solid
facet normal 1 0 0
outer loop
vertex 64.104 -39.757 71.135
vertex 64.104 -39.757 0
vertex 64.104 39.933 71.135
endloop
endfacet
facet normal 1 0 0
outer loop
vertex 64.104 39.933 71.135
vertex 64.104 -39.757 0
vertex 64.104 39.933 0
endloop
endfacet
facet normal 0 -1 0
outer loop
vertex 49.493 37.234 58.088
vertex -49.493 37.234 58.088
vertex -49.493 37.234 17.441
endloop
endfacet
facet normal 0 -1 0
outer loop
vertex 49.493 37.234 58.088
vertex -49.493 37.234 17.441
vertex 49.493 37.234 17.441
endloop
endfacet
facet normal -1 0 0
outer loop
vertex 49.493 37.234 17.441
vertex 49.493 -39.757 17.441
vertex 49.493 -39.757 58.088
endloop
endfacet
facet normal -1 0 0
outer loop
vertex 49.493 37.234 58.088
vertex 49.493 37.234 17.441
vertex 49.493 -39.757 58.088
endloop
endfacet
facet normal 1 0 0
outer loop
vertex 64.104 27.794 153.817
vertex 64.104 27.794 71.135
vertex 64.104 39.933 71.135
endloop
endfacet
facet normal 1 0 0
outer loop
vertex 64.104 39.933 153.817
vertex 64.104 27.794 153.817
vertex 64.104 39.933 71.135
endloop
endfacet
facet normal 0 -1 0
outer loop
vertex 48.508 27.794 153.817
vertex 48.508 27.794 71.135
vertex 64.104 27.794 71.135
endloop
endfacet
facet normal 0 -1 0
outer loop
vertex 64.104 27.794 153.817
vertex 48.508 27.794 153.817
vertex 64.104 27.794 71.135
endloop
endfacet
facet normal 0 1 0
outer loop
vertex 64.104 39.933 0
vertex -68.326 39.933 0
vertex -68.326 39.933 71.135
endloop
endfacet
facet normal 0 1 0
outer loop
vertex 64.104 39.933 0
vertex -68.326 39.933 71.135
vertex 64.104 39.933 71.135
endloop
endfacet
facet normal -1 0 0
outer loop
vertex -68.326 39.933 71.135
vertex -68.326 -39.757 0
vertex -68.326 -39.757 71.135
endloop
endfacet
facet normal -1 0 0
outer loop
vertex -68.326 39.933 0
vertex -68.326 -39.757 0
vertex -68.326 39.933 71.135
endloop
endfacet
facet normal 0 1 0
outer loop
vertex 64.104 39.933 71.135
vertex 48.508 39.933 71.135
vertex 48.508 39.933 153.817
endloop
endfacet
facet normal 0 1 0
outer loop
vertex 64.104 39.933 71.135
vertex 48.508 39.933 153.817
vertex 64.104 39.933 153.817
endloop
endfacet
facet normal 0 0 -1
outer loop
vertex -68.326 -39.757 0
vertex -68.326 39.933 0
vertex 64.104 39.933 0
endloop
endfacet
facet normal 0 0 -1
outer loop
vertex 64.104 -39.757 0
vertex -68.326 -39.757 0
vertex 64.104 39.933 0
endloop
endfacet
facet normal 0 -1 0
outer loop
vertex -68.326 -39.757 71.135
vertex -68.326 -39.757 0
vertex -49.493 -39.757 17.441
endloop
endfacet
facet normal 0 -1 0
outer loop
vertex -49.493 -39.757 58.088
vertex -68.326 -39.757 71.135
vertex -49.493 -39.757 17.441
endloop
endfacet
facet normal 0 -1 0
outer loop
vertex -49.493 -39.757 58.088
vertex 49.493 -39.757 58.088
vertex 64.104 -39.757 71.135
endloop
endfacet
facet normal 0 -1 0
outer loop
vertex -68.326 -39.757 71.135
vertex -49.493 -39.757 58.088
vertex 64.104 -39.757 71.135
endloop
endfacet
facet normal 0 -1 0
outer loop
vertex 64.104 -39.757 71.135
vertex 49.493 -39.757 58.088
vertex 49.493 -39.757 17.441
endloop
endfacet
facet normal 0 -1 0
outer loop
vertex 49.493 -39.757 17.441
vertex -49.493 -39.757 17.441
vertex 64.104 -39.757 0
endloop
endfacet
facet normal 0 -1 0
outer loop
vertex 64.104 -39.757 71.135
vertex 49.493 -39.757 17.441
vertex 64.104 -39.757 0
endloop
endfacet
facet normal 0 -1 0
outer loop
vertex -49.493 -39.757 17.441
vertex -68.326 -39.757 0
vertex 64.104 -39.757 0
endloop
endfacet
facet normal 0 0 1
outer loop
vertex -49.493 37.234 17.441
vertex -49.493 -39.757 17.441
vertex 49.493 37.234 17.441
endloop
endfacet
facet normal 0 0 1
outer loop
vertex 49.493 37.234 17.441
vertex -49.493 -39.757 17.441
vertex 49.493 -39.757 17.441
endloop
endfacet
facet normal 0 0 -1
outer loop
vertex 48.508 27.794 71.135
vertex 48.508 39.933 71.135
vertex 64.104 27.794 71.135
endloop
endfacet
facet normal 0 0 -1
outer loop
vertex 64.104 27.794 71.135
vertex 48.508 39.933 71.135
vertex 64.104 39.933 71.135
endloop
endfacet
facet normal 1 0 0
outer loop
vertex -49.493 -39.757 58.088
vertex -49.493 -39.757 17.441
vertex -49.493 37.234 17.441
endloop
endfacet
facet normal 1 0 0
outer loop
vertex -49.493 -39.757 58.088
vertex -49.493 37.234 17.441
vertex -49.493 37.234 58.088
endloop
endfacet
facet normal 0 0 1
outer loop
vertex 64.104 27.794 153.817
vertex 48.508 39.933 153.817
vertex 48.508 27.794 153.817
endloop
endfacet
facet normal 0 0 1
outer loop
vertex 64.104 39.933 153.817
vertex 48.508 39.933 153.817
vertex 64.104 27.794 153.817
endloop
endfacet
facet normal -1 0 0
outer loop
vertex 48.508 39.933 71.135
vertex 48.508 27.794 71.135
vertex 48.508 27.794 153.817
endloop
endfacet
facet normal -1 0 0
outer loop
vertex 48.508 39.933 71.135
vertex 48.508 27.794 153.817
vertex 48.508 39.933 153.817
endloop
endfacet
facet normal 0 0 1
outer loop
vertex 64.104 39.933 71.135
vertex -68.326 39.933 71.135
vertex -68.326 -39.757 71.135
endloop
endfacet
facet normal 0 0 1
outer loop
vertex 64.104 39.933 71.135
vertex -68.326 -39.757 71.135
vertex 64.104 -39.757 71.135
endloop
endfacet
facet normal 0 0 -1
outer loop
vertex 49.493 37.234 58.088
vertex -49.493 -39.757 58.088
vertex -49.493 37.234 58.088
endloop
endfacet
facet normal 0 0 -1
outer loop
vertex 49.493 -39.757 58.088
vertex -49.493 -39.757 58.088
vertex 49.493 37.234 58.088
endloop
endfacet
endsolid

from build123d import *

# Parameters (mm, degrees)
F0_W     = 132.4301
F0_H     = 79.689402
F1_DEPTH = 71.134962
F3_W     = 98.986716
F3_H     = 40.646881
F4_DEPTH = 76.99018
F5_W     = 15.595557
F5_H     = 12.138546
F6_DEPTH = 82.682267


with BuildPart() as f1:
    # F0 (on Top) → F1 (new body)
    with BuildSketch(Plane.XY):
        with Locations((-2.111013, 0.088027)):
            Rectangle(F0_W, F0_H)
    extrude(amount=F1_DEPTH)

    # F3 (on face) → F4 (cut)
    with BuildSketch(Plane.XZ.offset(39.756674)):
        with Locations((0, 37.764803)):
            Rectangle(F3_W, F3_H)
    extrude(amount=-F4_DEPTH, mode=Mode.SUBTRACT)


with BuildPart() as f6:
    # F5 (on face) → F6 (new body)
    with BuildSketch(Plane.XY.offset(71.134962)):
        with Locations((56.306258, 33.863455)):
            Rectangle(F5_W, F5_H)
    extrude(amount=F6_DEPTH)


solid = Compound([f1.part, f6.part])
